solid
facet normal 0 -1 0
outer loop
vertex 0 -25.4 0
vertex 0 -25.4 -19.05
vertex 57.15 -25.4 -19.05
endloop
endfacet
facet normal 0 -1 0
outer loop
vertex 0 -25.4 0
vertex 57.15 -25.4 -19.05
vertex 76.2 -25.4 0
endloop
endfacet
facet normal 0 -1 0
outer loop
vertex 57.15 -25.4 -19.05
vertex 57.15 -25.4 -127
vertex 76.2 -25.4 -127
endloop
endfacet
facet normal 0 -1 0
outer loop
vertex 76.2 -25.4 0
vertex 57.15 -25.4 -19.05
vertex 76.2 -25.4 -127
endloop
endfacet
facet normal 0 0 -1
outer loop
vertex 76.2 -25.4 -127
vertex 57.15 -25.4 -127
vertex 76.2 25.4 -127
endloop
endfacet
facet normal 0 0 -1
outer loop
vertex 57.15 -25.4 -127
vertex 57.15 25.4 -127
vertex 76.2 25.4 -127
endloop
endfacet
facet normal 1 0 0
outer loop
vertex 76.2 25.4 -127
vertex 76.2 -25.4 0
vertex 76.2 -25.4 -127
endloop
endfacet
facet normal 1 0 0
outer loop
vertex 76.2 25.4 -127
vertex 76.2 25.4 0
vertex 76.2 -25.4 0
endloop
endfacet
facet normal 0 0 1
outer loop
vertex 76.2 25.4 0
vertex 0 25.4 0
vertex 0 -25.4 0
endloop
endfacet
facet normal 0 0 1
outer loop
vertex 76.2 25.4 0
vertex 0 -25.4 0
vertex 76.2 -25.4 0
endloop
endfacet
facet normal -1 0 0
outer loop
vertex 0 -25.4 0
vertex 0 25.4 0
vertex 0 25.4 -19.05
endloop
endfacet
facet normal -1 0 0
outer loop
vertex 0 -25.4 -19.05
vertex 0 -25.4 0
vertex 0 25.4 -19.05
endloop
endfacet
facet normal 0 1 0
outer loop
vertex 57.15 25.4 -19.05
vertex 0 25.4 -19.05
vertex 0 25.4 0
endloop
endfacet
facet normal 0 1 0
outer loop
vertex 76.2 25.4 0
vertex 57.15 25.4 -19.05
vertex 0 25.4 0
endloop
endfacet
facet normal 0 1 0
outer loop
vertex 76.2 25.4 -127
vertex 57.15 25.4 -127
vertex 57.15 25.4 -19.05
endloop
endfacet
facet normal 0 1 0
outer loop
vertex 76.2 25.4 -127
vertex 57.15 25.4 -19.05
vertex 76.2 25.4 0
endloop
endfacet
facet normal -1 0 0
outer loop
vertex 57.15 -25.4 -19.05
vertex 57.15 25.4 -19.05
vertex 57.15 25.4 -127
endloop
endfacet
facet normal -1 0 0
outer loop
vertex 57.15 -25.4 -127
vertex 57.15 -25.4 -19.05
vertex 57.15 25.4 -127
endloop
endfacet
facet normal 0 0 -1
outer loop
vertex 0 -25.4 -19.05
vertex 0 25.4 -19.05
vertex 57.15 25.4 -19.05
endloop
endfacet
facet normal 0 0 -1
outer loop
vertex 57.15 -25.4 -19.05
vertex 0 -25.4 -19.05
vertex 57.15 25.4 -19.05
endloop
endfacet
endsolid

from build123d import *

# Parameters (mm, degrees)
SKETCH1_W           = 19.05
SKETCH1_H           = 107.95
SKETCH1_W_2         = 76.2
SKETCH1_H_2         = 19.05
BOSS_EXTRUDE1_DEPTH = 25.4


with BuildPart() as part:
    # Sketch1 → Boss-Extrude1 (new body, symmetric)
    with BuildSketch(Plane(origin=(0, 0, 0), x_dir=(1, 0, 0), z_dir=(0, 1, 0))):
        with Locations((66.675, 73.025)):
            Rectangle(SKETCH1_W, SKETCH1_H)
        with Locations((38.1, 9.525)):
            Rectangle(SKETCH1_W_2, SKETCH1_H_2)
    extrude(amount=BOSS_EXTRUDE1_DEPTH, both=True)


solid = part.part
